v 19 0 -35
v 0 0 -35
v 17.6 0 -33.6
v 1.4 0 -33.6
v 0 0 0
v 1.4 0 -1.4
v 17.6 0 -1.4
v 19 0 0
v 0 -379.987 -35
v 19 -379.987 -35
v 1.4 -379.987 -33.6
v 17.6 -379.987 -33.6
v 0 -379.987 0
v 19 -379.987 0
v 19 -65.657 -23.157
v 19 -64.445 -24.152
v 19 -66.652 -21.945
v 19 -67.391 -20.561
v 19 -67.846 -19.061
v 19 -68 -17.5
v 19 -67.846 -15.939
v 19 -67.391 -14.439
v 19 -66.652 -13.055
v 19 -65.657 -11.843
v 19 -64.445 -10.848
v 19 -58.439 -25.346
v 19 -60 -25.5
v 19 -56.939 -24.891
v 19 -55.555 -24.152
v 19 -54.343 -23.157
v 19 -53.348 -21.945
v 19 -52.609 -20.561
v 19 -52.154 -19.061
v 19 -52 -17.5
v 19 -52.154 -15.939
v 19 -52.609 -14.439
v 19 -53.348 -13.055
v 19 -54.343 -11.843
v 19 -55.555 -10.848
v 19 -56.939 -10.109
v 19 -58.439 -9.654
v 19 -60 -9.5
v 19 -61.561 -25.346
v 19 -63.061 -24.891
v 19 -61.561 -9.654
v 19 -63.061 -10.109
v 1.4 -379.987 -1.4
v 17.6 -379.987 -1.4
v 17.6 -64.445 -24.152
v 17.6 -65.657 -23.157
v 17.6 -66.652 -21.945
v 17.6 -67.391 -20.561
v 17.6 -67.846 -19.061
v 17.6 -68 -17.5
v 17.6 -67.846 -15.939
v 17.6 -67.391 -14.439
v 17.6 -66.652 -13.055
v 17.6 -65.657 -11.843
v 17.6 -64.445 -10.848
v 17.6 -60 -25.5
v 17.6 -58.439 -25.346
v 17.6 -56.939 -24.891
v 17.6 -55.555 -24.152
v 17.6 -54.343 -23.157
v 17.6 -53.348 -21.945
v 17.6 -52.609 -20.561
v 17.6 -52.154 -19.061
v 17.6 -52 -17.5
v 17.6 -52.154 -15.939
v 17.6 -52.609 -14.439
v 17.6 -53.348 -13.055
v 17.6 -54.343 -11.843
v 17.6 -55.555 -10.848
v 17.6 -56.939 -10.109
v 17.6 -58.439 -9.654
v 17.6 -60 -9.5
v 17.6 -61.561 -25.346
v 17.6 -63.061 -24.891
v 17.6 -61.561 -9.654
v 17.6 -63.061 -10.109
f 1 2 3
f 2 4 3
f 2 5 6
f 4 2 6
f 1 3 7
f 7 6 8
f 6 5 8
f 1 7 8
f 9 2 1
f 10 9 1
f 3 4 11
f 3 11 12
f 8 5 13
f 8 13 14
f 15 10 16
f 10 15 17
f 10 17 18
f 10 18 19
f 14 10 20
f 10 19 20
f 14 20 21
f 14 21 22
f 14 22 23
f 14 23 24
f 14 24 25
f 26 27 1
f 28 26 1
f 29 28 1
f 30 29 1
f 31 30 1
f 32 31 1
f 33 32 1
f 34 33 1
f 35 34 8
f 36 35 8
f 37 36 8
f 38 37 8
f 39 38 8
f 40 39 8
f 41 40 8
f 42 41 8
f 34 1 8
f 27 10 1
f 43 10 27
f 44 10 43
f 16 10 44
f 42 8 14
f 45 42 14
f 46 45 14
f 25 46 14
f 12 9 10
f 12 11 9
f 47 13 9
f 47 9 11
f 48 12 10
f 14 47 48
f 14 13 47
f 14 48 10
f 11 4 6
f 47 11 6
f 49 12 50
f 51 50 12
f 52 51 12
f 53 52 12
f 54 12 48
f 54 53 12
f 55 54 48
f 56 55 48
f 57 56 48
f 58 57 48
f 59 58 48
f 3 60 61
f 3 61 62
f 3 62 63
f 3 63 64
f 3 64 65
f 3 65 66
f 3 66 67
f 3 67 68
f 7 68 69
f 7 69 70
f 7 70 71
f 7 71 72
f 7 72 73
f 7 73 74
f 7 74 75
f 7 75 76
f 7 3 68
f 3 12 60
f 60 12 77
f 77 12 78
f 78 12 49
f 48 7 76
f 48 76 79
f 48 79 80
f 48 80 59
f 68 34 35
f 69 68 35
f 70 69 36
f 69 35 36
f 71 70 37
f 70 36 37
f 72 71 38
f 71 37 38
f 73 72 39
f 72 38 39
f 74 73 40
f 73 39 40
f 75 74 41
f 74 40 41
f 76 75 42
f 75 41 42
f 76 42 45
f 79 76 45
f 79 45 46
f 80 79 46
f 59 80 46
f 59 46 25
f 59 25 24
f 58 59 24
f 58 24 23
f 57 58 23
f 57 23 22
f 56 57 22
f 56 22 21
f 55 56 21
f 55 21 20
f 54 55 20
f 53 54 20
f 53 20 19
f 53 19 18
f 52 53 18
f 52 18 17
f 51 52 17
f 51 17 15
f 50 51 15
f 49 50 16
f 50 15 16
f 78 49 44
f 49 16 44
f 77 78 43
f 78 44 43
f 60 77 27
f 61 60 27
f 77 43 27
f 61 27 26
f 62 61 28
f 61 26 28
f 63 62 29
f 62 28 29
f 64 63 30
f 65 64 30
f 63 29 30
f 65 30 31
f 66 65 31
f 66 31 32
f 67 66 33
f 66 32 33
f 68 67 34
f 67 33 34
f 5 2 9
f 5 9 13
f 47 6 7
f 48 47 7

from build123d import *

# Parameters (mm, degrees)
F0_W     = 19
F0_H     = 35
F0_W_2   = 16.2
F0_H_2   = 32.2
F1_DEPTH = 379.987259
F2_R     = 8
F3_DEPTH = 15


with BuildPart() as f1:
    # F0 (on Front) → F1 (new body)
    with BuildSketch(Plane.XZ):
        with Locations((9.5, -17.5)):
            Rectangle(F0_W, F0_H)
        with Locations((9.5, -17.5)):
            Rectangle(F0_W_2, F0_H_2, mode=Mode.SUBTRACT)
    extrude(amount=F1_DEPTH)

    # F2 (on face) → F3 (cut)
    with BuildSketch(Plane.YZ.offset(19)):
        with Locations((-60, -17.5)):
            Circle(F2_R)
    extrude(amount=-F3_DEPTH, mode=Mode.SUBTRACT)


solid = f1.part
